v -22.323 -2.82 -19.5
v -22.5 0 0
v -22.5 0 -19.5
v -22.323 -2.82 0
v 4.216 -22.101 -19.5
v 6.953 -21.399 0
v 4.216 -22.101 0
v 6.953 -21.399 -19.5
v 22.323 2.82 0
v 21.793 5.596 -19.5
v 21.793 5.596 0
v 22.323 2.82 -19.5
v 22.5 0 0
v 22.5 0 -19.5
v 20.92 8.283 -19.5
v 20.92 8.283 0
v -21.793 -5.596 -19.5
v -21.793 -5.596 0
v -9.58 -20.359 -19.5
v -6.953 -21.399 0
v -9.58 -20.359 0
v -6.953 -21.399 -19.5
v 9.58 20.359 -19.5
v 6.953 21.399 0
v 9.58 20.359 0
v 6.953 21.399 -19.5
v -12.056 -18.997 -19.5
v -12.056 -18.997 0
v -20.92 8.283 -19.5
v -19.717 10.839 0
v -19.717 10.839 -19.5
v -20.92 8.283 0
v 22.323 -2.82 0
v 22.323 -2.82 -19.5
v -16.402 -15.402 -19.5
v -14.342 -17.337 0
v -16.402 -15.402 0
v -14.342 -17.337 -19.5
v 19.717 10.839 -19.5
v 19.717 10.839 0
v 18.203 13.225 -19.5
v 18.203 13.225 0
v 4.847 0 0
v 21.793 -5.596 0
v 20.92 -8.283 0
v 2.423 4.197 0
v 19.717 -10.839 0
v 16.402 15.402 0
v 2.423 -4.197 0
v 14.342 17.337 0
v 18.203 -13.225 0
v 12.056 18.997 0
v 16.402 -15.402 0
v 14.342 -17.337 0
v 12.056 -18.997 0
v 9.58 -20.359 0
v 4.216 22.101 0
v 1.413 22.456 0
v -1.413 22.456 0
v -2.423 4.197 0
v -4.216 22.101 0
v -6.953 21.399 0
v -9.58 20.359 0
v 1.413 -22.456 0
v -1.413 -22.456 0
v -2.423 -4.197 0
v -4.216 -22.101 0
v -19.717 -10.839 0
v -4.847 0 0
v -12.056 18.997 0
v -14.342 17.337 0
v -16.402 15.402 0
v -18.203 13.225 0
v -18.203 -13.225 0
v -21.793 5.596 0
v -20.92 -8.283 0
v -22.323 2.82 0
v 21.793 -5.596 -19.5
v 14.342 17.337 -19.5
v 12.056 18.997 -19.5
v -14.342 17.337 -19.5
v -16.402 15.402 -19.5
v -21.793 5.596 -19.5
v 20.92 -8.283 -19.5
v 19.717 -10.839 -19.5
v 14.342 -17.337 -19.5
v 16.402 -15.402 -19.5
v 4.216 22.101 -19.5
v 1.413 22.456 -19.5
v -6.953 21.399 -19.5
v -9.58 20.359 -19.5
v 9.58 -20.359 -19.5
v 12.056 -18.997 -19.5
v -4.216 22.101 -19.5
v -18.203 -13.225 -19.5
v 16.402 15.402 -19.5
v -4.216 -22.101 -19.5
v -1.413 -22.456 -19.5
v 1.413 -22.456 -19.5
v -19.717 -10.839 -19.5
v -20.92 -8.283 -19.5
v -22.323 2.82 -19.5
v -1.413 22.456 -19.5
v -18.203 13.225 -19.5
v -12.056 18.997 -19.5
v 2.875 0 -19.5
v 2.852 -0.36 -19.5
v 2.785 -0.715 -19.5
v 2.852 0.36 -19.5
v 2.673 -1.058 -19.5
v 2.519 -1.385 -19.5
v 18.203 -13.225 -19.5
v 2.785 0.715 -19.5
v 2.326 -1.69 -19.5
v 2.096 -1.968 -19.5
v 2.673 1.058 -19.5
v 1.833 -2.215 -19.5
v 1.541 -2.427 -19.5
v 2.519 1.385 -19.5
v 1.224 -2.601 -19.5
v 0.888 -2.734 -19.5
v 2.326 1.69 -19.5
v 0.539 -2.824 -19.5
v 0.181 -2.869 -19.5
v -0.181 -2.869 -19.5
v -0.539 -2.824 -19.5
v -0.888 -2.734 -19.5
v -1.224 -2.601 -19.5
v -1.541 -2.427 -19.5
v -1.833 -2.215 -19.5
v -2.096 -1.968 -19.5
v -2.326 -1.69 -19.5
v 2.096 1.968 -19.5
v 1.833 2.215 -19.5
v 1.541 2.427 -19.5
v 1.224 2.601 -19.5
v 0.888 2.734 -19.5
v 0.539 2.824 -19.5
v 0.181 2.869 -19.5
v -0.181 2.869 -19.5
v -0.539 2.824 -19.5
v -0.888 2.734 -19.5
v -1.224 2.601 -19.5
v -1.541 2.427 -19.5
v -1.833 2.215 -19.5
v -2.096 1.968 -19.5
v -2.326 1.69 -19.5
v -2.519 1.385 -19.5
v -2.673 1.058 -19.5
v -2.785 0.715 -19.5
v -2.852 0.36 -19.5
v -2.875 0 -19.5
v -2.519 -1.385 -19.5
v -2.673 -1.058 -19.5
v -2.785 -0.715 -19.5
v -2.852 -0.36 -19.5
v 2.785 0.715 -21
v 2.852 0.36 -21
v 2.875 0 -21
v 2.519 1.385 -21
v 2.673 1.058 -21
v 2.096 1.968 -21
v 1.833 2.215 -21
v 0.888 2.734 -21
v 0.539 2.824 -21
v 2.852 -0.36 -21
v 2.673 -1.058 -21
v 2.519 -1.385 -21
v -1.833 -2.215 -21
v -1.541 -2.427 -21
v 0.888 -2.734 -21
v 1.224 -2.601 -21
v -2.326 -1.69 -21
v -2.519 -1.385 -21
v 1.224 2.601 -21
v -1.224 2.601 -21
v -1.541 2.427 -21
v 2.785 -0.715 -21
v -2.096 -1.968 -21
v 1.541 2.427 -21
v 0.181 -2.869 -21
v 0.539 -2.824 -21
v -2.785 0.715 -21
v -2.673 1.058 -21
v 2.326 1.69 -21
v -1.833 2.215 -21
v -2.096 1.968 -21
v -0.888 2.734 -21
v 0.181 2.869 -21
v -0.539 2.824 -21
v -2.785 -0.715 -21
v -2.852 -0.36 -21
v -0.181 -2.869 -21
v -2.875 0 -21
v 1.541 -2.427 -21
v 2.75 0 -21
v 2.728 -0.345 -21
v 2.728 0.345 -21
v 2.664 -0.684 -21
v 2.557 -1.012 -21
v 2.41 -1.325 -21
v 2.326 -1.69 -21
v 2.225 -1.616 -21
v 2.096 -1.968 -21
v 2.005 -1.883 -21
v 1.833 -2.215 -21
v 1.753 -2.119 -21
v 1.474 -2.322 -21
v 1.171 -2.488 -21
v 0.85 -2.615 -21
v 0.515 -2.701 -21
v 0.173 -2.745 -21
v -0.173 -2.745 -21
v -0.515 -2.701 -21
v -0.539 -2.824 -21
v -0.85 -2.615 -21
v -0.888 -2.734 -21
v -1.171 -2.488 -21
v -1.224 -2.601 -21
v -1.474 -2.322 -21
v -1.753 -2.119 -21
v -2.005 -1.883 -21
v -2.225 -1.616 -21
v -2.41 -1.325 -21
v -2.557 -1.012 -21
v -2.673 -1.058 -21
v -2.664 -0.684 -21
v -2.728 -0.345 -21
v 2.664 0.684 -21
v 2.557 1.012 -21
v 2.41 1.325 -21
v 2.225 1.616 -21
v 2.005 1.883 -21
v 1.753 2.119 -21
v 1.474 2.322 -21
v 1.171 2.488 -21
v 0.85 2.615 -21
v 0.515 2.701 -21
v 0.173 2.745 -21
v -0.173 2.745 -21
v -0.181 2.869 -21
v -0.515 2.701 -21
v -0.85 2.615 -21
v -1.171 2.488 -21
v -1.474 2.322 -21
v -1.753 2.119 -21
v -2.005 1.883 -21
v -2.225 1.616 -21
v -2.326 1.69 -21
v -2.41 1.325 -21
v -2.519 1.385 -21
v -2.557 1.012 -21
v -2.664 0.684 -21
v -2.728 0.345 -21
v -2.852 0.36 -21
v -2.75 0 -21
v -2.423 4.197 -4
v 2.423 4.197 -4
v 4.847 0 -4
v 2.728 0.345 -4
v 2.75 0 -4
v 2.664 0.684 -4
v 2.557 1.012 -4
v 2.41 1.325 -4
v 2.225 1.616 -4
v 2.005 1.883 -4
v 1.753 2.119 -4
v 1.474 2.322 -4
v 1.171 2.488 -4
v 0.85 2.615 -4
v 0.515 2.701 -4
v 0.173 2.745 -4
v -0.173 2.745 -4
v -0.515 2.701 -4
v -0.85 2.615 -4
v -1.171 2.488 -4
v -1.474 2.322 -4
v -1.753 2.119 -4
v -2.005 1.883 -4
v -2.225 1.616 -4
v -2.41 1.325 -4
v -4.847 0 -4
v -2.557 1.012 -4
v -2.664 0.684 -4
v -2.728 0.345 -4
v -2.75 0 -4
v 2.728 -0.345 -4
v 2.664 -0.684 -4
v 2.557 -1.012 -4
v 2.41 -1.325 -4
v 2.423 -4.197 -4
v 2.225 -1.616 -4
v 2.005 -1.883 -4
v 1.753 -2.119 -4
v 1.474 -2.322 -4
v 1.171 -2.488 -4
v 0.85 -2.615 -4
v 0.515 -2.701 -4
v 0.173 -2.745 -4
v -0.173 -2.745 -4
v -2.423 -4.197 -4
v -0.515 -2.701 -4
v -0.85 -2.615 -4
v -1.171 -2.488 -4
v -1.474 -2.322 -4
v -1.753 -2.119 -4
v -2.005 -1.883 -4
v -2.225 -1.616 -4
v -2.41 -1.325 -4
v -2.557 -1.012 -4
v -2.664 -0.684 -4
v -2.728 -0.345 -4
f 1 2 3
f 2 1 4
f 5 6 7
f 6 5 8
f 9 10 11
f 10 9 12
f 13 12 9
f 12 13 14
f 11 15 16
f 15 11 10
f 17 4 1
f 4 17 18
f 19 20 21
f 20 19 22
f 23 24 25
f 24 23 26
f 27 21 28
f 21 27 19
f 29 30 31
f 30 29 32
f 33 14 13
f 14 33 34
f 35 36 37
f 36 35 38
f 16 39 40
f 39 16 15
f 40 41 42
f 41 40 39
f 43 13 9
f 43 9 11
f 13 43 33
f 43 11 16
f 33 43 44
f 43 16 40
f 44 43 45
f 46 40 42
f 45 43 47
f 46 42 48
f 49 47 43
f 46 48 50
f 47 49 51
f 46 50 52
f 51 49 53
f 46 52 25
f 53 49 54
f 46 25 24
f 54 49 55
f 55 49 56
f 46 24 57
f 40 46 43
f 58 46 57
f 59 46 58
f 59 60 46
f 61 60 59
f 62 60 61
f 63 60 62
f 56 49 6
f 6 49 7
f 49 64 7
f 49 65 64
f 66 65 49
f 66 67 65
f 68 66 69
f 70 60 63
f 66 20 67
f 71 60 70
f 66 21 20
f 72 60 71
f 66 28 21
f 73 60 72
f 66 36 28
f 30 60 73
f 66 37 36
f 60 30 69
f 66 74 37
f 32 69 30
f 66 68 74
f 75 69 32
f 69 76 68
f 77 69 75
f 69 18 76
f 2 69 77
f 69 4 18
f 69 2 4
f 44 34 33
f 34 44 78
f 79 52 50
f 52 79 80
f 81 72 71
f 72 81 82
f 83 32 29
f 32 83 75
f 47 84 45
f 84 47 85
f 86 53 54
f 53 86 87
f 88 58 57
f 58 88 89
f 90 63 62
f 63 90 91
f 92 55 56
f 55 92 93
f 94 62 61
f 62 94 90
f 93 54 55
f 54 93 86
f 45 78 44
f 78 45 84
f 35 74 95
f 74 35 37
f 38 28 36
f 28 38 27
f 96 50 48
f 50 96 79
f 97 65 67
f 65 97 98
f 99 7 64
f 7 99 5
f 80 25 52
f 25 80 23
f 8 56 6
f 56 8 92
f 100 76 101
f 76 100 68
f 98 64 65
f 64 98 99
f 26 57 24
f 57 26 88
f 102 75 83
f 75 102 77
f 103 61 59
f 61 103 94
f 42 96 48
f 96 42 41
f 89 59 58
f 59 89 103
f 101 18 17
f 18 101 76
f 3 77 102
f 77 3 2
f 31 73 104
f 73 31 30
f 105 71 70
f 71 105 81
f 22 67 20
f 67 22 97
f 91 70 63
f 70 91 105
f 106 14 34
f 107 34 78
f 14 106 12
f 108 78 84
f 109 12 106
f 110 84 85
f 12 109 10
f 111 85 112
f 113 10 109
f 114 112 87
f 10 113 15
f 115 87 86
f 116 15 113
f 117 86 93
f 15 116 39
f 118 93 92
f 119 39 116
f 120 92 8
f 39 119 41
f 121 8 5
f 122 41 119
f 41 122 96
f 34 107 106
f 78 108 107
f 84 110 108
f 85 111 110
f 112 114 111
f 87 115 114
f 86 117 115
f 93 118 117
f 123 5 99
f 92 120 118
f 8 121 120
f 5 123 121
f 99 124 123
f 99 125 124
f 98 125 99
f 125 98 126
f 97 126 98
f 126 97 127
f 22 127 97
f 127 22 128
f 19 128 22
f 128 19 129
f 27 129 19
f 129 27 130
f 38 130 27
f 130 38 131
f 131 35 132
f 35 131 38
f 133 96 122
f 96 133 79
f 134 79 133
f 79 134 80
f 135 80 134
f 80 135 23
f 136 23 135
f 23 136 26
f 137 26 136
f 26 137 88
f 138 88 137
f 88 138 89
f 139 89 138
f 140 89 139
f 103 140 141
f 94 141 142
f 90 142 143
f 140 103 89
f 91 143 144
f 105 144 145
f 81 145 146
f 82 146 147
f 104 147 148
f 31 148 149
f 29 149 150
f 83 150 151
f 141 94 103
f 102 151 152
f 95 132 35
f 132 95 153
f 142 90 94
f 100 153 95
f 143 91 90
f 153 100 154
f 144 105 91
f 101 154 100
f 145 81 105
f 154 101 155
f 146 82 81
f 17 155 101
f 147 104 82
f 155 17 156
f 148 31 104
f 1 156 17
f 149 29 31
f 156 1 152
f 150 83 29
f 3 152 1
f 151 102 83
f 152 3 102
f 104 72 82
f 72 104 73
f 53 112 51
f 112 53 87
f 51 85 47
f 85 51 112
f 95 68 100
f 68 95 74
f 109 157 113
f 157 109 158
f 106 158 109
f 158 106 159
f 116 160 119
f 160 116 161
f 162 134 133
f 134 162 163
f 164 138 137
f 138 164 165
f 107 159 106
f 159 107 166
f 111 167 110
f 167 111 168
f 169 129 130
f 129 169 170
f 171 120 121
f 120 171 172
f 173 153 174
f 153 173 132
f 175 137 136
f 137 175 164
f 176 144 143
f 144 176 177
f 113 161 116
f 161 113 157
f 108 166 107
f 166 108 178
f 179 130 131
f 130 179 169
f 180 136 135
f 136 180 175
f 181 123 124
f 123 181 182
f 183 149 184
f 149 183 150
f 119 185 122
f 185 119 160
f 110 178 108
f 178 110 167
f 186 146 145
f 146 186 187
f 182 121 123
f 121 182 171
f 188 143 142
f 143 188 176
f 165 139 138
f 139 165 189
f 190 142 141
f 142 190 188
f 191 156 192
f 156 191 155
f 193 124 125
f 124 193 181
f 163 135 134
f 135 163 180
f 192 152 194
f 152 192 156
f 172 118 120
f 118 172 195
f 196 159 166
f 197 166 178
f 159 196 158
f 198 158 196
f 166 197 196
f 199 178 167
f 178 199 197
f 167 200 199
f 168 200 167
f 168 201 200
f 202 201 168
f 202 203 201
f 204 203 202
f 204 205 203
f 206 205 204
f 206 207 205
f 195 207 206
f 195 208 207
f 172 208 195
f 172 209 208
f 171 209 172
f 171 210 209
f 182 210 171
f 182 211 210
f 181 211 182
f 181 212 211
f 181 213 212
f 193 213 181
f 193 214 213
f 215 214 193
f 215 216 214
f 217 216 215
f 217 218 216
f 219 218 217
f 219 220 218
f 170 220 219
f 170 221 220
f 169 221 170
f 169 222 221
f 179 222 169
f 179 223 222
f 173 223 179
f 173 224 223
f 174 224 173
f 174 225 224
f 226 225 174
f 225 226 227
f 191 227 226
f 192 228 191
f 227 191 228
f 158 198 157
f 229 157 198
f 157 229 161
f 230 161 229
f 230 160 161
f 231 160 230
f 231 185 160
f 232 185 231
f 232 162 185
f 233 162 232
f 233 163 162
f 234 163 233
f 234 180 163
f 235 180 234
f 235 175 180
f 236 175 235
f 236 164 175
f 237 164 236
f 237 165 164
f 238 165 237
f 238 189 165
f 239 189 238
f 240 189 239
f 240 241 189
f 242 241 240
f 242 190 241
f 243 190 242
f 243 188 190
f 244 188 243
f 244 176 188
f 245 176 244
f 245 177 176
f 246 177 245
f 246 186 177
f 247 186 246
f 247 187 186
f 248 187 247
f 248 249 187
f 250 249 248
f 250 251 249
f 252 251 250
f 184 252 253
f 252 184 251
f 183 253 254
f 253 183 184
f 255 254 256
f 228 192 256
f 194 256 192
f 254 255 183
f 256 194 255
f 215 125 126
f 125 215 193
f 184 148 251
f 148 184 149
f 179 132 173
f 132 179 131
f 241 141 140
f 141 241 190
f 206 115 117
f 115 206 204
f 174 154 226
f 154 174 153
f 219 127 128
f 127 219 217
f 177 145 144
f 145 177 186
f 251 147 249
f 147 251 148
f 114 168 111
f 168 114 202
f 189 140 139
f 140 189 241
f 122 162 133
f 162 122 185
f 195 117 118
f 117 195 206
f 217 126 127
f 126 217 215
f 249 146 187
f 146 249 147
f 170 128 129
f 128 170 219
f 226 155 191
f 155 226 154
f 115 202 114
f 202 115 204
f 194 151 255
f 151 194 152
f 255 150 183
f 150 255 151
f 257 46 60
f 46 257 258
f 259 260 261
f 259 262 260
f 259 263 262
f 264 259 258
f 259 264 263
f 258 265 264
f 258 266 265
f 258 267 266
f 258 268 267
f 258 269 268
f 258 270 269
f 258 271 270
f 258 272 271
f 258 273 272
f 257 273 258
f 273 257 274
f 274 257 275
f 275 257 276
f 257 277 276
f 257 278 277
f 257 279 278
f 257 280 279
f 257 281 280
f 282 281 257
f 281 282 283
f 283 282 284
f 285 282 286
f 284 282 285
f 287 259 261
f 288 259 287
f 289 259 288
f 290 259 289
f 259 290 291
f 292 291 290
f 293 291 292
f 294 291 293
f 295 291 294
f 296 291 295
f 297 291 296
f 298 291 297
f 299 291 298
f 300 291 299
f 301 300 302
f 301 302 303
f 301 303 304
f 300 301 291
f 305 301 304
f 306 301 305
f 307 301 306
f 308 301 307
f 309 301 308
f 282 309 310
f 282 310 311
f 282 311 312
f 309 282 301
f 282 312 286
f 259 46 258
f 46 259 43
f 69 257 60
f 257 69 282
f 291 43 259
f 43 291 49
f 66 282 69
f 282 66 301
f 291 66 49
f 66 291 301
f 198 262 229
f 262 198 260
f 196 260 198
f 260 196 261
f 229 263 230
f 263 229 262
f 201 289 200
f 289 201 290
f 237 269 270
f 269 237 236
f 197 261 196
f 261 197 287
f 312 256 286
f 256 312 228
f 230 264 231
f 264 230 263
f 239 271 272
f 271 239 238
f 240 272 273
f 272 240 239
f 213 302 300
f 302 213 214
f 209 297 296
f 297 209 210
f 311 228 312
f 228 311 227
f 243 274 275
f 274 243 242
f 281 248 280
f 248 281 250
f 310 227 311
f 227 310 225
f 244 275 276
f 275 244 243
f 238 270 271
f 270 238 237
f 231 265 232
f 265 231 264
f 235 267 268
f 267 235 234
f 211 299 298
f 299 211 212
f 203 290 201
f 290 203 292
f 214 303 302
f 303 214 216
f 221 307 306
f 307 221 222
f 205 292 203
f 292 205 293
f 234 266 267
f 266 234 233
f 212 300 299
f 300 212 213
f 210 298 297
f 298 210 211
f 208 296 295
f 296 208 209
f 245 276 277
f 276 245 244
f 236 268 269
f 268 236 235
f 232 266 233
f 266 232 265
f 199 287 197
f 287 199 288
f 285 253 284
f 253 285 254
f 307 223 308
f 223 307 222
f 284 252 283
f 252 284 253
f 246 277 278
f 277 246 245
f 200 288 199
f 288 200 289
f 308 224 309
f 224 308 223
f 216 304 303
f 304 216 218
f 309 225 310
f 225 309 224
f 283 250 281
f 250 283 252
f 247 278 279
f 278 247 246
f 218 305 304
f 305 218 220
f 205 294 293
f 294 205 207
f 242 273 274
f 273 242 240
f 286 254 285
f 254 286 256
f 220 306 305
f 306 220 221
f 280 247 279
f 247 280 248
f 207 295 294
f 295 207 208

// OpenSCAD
$fn = 50;

difference() {
	union() {
		translate(v = [0, 0, -19.5]) {
			cylinder(h = 19.5, r = 22.5);
		}
		#translate(v = [0, 0, -21.0]) {
			cylinder(h = 21, r = 2.875);
		}
	}
	union() {
		translate(v = [0, 0, 0]) {
			rotate(a = [0, 0, 0]) {
				difference() {
					union() {
						translate(v = [0, 0, -4]) {
							linear_extrude(height = 4) {
								polygon(points = [[4.8468, 0.0], [2.4234000000000004, 4.197451927062417], [-2.423399999999999, 4.197451927062417], [-4.8468, 5.935618106107392e-16], [-2.423400000000002, -4.197451927062416], [2.423399999999997, -4.197451927062419]]);
							}
						}
					}
					union();
				}
			}
		}
		#translate(v = [0, 0, -100.0]) {
			cylinder(h = 200, r = 2.75);
		}
	}
}
